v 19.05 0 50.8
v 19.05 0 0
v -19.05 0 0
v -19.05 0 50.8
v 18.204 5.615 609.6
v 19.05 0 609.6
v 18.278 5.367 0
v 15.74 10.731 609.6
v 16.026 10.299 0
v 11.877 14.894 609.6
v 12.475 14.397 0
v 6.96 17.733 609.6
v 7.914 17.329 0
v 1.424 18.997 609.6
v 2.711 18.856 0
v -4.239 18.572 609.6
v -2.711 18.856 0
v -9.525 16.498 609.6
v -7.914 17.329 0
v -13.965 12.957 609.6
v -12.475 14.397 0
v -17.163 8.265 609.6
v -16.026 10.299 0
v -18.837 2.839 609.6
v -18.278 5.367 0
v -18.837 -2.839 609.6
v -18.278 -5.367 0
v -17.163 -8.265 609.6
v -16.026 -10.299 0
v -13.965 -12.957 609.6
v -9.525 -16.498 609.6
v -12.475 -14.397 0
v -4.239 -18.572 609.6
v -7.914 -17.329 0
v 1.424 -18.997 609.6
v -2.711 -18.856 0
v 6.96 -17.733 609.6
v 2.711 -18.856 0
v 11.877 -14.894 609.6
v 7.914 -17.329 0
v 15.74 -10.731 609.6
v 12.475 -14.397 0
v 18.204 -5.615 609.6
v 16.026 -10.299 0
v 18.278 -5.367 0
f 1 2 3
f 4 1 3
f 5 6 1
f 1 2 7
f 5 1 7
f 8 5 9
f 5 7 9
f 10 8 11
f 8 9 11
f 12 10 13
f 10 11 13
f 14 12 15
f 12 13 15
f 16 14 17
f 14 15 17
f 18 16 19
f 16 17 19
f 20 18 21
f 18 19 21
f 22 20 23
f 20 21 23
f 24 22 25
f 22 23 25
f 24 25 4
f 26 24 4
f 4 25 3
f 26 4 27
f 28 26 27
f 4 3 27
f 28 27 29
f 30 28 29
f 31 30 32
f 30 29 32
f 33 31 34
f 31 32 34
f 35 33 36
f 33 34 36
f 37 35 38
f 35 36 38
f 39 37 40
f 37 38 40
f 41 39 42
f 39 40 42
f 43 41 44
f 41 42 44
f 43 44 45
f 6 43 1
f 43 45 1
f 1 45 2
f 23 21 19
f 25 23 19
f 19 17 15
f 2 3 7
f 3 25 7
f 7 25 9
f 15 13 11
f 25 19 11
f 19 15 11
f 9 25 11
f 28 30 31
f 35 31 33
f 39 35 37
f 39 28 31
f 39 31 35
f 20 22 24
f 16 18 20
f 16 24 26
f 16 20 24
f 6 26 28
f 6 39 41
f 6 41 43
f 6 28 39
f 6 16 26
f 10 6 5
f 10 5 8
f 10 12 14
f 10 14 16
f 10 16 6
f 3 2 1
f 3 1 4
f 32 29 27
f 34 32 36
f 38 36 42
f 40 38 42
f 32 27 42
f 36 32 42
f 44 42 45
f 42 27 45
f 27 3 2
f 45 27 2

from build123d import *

# Parameters (mm, degrees)
SKETCH1_R           = 19.05
BOSS_EXTRUDE2_DEPTH = 609.6
SKETCH2_W           = 38.1
SKETCH2_H           = 0.0005
CUT_EXTRUDE1_DEPTH  = 50.8
SKETCH5_W           = 38.1
SKETCH5_H           = 0.0005
CUT_EXTRUDE6_DEPTH  = 50.8


with BuildPart() as part:
    # Sketch1 → Boss-Extrude2 (new body)
    with BuildSketch(Plane.XY):
        Circle(SKETCH1_R)
    extrude(amount=BOSS_EXTRUDE2_DEPTH)

    # Sketch2 → Cut-Extrude1 (cut)
    with BuildSketch(Plane(origin=(0, 0, 0), x_dir=(-1, 0, 0), z_dir=(0, 0, -1))):
        with Locations((0, 0.00025)):
            Rectangle(SKETCH2_W, SKETCH2_H)
    extrude(amount=-CUT_EXTRUDE1_DEPTH, mode=Mode.SUBTRACT)

    # Sketch5 → Cut-Extrude6 (cut)
    with BuildSketch(Plane(origin=(0, 0, 0), x_dir=(-1, 0, 0), z_dir=(0, 0, -1))):
        with Locations((0, -0.00025)):
            Rectangle(SKETCH5_W, SKETCH5_H)
    extrude(amount=-CUT_EXTRUDE6_DEPTH, mode=Mode.SUBTRACT)


solid = part.part
